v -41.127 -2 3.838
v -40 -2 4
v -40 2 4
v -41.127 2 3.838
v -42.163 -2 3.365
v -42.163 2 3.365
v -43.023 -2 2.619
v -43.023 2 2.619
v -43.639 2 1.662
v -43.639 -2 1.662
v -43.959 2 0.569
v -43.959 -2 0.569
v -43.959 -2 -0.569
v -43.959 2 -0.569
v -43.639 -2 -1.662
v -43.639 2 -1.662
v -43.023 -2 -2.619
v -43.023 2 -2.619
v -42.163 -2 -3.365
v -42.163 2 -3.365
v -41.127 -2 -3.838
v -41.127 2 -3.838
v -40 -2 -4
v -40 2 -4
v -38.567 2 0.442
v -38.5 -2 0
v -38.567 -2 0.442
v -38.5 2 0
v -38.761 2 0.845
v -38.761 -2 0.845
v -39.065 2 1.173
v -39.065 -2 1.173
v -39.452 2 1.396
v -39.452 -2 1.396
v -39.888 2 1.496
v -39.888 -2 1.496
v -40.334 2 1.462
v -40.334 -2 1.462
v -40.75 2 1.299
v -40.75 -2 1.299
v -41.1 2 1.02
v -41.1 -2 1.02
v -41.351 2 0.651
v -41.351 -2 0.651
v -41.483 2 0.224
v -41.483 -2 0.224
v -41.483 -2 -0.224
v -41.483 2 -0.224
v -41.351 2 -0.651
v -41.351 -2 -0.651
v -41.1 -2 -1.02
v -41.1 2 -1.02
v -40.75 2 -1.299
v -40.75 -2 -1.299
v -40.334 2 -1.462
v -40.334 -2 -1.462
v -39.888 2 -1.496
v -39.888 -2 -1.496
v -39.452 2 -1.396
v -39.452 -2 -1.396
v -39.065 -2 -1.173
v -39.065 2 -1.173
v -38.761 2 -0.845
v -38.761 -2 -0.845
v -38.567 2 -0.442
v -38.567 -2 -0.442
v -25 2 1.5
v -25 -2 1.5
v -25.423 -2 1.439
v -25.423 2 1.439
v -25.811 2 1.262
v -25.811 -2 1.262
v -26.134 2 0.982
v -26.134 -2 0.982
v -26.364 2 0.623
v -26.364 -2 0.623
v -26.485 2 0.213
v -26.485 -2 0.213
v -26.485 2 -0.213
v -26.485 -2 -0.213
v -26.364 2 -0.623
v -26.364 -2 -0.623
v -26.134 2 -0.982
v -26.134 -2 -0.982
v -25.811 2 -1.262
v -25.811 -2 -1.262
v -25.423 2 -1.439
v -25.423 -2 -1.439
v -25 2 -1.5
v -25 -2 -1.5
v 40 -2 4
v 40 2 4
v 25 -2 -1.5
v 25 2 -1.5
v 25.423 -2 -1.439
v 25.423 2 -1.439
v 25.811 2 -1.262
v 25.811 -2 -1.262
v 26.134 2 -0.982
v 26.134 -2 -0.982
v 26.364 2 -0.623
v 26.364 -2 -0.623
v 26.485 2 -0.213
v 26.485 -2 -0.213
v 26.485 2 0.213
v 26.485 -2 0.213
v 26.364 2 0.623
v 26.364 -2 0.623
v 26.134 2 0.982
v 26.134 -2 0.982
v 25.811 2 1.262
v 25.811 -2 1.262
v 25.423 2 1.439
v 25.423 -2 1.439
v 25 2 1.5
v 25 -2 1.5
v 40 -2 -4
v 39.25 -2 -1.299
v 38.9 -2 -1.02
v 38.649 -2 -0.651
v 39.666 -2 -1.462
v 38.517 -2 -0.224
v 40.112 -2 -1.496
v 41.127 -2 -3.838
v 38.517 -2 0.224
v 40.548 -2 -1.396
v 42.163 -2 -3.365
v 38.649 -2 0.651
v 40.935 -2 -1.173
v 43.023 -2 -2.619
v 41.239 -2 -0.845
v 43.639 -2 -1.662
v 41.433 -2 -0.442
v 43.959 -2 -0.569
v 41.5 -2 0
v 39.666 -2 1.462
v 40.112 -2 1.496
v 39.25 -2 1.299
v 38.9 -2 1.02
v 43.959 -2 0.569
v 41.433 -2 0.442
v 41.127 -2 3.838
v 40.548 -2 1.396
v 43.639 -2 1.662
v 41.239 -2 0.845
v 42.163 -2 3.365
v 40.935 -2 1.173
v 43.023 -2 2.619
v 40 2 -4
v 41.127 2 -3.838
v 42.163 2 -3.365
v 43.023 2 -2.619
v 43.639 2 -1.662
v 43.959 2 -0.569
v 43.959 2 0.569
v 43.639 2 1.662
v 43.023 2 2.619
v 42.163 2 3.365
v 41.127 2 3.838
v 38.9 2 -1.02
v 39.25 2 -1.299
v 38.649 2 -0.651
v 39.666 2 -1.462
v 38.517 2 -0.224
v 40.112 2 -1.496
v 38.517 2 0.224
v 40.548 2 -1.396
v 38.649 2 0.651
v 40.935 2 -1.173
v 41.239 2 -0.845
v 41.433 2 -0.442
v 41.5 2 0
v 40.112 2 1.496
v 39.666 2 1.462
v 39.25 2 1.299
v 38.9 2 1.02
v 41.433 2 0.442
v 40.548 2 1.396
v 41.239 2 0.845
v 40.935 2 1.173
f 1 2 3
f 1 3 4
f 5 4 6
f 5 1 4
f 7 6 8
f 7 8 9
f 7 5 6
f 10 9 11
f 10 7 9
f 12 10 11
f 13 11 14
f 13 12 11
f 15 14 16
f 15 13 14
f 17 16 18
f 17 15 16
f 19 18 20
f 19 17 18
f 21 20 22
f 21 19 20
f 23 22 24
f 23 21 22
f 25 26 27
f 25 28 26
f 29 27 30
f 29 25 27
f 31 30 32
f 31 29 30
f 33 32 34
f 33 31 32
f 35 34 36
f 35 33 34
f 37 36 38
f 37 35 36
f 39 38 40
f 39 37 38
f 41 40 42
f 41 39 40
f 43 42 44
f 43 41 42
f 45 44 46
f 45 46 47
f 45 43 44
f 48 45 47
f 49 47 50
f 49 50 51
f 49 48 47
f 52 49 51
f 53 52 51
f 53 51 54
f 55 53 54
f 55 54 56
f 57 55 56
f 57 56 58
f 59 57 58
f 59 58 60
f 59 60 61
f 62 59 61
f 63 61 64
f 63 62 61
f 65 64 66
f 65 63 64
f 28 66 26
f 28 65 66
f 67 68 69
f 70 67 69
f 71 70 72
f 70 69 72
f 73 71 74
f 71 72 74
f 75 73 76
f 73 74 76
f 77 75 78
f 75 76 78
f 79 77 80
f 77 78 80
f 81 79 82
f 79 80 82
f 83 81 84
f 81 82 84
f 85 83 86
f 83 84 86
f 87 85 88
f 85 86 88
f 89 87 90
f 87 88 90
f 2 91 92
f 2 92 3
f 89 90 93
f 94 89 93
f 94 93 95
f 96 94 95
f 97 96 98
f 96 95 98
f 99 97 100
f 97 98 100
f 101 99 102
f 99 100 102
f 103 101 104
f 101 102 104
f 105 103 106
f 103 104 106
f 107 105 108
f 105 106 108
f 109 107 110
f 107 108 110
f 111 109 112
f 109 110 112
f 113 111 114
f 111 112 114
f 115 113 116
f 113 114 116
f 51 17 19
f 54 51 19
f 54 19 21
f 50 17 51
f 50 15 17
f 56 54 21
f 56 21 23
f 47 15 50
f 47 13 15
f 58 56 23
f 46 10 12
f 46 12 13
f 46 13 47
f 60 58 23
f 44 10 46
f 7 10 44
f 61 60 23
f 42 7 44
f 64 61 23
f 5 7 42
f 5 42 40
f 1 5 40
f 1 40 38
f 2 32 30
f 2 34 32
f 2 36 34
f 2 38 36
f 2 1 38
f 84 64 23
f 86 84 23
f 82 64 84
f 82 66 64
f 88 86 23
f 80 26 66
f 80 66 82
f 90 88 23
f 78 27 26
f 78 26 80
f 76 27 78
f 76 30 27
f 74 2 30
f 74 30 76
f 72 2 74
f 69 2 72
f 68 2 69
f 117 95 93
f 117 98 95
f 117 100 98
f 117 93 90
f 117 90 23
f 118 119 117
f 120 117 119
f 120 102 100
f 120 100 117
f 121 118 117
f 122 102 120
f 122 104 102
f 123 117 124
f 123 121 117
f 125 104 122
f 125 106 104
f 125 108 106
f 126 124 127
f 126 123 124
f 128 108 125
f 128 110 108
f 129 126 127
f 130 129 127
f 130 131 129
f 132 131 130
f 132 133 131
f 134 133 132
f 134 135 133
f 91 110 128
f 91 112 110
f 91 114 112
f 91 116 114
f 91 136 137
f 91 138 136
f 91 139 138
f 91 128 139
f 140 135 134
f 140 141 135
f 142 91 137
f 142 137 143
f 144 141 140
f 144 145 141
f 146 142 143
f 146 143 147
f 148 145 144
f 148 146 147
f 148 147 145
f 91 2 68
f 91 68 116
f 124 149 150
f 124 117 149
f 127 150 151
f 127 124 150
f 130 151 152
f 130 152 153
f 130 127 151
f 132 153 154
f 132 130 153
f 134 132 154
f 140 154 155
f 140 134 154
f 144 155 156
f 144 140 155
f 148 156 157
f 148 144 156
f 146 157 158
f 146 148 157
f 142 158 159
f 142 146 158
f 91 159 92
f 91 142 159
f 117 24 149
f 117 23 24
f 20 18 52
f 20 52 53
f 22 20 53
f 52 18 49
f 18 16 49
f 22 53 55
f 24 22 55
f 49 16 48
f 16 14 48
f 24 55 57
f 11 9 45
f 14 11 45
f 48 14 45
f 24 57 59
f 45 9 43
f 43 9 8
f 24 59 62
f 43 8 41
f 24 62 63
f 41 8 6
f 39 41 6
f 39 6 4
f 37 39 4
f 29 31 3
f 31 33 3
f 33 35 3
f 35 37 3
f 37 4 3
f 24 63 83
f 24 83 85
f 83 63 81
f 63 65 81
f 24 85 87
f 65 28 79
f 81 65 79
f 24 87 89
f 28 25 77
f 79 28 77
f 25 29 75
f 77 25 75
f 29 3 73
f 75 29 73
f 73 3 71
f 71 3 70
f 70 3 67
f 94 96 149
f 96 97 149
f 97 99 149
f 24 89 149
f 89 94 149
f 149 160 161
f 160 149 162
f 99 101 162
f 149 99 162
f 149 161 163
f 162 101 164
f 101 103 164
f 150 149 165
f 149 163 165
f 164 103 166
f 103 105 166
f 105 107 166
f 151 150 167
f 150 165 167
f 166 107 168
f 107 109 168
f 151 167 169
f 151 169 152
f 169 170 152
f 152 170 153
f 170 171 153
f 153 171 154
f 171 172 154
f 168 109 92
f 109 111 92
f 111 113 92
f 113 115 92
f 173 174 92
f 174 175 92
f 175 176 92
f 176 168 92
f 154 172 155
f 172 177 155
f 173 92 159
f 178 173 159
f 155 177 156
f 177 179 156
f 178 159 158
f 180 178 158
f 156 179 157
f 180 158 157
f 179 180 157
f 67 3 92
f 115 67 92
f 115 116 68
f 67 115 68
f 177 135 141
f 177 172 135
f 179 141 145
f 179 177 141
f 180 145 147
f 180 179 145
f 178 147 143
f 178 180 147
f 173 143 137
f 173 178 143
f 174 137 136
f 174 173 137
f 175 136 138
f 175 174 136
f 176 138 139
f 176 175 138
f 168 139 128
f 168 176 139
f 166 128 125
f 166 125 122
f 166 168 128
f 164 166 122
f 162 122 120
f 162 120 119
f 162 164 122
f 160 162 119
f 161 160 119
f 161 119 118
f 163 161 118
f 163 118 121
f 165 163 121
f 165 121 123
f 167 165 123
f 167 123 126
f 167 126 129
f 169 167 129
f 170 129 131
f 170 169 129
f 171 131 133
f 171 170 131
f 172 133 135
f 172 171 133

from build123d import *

# Parameters (mm, degrees)
F0_R     = 1.5
F1_DEPTH = 2
F3_DEPTH = 25


with BuildPart() as f1:
    # F0 (on Front) → F1 (new body, symmetric)
    with BuildSketch(Plane.XZ):
        with BuildLine():
            ThreePointArc((40, -4), (44, 0), (40, 4))
            Line((40, 4), (-40, 4))
            ThreePointArc((-40, 4), (-44, 0), (-40, -4))
            Line((-40, -4), (40, -4))
        make_face()
        with Locations((-40, 0)):
            Circle(F0_R, mode=Mode.SUBTRACT)
        with Locations((-10, 0)):
            Circle(F0_R, mode=Mode.SUBTRACT)
        with Locations((40, 0)):
            Circle(F0_R, mode=Mode.SUBTRACT)
    extrude(amount=F1_DEPTH, both=True)

    # F2 (on face) → F3 (cut)
    with BuildSketch(Plane.XZ.offset(2)):
        with BuildLine():
            Line((-10, 1.5), (-25, 1.5))
            ThreePointArc((-25, 1.5), (-26.5, 0), (-25, -1.5))
            Line((-25, -1.5), (-10, -1.5))
            ThreePointArc((-10, -1.5), (-11.5, 0), (-10, 1.5))
        make_face()
        with BuildLine():
            Line((25, 1.5), (-10, 1.5))
            ThreePointArc((-10, 1.5), (-8.93934, 1.06066), (-8.5, 0))
            ThreePointArc((-8.5, 0), (-8.93934, -1.06066), (-10, -1.5))
            Line((-10, -1.5), (25, -1.5))
            ThreePointArc((25, -1.5), (26.5, 0), (25, 1.5))
        make_face()
    extrude(amount=-F3_DEPTH, mode=Mode.SUBTRACT)


solid = f1.part
